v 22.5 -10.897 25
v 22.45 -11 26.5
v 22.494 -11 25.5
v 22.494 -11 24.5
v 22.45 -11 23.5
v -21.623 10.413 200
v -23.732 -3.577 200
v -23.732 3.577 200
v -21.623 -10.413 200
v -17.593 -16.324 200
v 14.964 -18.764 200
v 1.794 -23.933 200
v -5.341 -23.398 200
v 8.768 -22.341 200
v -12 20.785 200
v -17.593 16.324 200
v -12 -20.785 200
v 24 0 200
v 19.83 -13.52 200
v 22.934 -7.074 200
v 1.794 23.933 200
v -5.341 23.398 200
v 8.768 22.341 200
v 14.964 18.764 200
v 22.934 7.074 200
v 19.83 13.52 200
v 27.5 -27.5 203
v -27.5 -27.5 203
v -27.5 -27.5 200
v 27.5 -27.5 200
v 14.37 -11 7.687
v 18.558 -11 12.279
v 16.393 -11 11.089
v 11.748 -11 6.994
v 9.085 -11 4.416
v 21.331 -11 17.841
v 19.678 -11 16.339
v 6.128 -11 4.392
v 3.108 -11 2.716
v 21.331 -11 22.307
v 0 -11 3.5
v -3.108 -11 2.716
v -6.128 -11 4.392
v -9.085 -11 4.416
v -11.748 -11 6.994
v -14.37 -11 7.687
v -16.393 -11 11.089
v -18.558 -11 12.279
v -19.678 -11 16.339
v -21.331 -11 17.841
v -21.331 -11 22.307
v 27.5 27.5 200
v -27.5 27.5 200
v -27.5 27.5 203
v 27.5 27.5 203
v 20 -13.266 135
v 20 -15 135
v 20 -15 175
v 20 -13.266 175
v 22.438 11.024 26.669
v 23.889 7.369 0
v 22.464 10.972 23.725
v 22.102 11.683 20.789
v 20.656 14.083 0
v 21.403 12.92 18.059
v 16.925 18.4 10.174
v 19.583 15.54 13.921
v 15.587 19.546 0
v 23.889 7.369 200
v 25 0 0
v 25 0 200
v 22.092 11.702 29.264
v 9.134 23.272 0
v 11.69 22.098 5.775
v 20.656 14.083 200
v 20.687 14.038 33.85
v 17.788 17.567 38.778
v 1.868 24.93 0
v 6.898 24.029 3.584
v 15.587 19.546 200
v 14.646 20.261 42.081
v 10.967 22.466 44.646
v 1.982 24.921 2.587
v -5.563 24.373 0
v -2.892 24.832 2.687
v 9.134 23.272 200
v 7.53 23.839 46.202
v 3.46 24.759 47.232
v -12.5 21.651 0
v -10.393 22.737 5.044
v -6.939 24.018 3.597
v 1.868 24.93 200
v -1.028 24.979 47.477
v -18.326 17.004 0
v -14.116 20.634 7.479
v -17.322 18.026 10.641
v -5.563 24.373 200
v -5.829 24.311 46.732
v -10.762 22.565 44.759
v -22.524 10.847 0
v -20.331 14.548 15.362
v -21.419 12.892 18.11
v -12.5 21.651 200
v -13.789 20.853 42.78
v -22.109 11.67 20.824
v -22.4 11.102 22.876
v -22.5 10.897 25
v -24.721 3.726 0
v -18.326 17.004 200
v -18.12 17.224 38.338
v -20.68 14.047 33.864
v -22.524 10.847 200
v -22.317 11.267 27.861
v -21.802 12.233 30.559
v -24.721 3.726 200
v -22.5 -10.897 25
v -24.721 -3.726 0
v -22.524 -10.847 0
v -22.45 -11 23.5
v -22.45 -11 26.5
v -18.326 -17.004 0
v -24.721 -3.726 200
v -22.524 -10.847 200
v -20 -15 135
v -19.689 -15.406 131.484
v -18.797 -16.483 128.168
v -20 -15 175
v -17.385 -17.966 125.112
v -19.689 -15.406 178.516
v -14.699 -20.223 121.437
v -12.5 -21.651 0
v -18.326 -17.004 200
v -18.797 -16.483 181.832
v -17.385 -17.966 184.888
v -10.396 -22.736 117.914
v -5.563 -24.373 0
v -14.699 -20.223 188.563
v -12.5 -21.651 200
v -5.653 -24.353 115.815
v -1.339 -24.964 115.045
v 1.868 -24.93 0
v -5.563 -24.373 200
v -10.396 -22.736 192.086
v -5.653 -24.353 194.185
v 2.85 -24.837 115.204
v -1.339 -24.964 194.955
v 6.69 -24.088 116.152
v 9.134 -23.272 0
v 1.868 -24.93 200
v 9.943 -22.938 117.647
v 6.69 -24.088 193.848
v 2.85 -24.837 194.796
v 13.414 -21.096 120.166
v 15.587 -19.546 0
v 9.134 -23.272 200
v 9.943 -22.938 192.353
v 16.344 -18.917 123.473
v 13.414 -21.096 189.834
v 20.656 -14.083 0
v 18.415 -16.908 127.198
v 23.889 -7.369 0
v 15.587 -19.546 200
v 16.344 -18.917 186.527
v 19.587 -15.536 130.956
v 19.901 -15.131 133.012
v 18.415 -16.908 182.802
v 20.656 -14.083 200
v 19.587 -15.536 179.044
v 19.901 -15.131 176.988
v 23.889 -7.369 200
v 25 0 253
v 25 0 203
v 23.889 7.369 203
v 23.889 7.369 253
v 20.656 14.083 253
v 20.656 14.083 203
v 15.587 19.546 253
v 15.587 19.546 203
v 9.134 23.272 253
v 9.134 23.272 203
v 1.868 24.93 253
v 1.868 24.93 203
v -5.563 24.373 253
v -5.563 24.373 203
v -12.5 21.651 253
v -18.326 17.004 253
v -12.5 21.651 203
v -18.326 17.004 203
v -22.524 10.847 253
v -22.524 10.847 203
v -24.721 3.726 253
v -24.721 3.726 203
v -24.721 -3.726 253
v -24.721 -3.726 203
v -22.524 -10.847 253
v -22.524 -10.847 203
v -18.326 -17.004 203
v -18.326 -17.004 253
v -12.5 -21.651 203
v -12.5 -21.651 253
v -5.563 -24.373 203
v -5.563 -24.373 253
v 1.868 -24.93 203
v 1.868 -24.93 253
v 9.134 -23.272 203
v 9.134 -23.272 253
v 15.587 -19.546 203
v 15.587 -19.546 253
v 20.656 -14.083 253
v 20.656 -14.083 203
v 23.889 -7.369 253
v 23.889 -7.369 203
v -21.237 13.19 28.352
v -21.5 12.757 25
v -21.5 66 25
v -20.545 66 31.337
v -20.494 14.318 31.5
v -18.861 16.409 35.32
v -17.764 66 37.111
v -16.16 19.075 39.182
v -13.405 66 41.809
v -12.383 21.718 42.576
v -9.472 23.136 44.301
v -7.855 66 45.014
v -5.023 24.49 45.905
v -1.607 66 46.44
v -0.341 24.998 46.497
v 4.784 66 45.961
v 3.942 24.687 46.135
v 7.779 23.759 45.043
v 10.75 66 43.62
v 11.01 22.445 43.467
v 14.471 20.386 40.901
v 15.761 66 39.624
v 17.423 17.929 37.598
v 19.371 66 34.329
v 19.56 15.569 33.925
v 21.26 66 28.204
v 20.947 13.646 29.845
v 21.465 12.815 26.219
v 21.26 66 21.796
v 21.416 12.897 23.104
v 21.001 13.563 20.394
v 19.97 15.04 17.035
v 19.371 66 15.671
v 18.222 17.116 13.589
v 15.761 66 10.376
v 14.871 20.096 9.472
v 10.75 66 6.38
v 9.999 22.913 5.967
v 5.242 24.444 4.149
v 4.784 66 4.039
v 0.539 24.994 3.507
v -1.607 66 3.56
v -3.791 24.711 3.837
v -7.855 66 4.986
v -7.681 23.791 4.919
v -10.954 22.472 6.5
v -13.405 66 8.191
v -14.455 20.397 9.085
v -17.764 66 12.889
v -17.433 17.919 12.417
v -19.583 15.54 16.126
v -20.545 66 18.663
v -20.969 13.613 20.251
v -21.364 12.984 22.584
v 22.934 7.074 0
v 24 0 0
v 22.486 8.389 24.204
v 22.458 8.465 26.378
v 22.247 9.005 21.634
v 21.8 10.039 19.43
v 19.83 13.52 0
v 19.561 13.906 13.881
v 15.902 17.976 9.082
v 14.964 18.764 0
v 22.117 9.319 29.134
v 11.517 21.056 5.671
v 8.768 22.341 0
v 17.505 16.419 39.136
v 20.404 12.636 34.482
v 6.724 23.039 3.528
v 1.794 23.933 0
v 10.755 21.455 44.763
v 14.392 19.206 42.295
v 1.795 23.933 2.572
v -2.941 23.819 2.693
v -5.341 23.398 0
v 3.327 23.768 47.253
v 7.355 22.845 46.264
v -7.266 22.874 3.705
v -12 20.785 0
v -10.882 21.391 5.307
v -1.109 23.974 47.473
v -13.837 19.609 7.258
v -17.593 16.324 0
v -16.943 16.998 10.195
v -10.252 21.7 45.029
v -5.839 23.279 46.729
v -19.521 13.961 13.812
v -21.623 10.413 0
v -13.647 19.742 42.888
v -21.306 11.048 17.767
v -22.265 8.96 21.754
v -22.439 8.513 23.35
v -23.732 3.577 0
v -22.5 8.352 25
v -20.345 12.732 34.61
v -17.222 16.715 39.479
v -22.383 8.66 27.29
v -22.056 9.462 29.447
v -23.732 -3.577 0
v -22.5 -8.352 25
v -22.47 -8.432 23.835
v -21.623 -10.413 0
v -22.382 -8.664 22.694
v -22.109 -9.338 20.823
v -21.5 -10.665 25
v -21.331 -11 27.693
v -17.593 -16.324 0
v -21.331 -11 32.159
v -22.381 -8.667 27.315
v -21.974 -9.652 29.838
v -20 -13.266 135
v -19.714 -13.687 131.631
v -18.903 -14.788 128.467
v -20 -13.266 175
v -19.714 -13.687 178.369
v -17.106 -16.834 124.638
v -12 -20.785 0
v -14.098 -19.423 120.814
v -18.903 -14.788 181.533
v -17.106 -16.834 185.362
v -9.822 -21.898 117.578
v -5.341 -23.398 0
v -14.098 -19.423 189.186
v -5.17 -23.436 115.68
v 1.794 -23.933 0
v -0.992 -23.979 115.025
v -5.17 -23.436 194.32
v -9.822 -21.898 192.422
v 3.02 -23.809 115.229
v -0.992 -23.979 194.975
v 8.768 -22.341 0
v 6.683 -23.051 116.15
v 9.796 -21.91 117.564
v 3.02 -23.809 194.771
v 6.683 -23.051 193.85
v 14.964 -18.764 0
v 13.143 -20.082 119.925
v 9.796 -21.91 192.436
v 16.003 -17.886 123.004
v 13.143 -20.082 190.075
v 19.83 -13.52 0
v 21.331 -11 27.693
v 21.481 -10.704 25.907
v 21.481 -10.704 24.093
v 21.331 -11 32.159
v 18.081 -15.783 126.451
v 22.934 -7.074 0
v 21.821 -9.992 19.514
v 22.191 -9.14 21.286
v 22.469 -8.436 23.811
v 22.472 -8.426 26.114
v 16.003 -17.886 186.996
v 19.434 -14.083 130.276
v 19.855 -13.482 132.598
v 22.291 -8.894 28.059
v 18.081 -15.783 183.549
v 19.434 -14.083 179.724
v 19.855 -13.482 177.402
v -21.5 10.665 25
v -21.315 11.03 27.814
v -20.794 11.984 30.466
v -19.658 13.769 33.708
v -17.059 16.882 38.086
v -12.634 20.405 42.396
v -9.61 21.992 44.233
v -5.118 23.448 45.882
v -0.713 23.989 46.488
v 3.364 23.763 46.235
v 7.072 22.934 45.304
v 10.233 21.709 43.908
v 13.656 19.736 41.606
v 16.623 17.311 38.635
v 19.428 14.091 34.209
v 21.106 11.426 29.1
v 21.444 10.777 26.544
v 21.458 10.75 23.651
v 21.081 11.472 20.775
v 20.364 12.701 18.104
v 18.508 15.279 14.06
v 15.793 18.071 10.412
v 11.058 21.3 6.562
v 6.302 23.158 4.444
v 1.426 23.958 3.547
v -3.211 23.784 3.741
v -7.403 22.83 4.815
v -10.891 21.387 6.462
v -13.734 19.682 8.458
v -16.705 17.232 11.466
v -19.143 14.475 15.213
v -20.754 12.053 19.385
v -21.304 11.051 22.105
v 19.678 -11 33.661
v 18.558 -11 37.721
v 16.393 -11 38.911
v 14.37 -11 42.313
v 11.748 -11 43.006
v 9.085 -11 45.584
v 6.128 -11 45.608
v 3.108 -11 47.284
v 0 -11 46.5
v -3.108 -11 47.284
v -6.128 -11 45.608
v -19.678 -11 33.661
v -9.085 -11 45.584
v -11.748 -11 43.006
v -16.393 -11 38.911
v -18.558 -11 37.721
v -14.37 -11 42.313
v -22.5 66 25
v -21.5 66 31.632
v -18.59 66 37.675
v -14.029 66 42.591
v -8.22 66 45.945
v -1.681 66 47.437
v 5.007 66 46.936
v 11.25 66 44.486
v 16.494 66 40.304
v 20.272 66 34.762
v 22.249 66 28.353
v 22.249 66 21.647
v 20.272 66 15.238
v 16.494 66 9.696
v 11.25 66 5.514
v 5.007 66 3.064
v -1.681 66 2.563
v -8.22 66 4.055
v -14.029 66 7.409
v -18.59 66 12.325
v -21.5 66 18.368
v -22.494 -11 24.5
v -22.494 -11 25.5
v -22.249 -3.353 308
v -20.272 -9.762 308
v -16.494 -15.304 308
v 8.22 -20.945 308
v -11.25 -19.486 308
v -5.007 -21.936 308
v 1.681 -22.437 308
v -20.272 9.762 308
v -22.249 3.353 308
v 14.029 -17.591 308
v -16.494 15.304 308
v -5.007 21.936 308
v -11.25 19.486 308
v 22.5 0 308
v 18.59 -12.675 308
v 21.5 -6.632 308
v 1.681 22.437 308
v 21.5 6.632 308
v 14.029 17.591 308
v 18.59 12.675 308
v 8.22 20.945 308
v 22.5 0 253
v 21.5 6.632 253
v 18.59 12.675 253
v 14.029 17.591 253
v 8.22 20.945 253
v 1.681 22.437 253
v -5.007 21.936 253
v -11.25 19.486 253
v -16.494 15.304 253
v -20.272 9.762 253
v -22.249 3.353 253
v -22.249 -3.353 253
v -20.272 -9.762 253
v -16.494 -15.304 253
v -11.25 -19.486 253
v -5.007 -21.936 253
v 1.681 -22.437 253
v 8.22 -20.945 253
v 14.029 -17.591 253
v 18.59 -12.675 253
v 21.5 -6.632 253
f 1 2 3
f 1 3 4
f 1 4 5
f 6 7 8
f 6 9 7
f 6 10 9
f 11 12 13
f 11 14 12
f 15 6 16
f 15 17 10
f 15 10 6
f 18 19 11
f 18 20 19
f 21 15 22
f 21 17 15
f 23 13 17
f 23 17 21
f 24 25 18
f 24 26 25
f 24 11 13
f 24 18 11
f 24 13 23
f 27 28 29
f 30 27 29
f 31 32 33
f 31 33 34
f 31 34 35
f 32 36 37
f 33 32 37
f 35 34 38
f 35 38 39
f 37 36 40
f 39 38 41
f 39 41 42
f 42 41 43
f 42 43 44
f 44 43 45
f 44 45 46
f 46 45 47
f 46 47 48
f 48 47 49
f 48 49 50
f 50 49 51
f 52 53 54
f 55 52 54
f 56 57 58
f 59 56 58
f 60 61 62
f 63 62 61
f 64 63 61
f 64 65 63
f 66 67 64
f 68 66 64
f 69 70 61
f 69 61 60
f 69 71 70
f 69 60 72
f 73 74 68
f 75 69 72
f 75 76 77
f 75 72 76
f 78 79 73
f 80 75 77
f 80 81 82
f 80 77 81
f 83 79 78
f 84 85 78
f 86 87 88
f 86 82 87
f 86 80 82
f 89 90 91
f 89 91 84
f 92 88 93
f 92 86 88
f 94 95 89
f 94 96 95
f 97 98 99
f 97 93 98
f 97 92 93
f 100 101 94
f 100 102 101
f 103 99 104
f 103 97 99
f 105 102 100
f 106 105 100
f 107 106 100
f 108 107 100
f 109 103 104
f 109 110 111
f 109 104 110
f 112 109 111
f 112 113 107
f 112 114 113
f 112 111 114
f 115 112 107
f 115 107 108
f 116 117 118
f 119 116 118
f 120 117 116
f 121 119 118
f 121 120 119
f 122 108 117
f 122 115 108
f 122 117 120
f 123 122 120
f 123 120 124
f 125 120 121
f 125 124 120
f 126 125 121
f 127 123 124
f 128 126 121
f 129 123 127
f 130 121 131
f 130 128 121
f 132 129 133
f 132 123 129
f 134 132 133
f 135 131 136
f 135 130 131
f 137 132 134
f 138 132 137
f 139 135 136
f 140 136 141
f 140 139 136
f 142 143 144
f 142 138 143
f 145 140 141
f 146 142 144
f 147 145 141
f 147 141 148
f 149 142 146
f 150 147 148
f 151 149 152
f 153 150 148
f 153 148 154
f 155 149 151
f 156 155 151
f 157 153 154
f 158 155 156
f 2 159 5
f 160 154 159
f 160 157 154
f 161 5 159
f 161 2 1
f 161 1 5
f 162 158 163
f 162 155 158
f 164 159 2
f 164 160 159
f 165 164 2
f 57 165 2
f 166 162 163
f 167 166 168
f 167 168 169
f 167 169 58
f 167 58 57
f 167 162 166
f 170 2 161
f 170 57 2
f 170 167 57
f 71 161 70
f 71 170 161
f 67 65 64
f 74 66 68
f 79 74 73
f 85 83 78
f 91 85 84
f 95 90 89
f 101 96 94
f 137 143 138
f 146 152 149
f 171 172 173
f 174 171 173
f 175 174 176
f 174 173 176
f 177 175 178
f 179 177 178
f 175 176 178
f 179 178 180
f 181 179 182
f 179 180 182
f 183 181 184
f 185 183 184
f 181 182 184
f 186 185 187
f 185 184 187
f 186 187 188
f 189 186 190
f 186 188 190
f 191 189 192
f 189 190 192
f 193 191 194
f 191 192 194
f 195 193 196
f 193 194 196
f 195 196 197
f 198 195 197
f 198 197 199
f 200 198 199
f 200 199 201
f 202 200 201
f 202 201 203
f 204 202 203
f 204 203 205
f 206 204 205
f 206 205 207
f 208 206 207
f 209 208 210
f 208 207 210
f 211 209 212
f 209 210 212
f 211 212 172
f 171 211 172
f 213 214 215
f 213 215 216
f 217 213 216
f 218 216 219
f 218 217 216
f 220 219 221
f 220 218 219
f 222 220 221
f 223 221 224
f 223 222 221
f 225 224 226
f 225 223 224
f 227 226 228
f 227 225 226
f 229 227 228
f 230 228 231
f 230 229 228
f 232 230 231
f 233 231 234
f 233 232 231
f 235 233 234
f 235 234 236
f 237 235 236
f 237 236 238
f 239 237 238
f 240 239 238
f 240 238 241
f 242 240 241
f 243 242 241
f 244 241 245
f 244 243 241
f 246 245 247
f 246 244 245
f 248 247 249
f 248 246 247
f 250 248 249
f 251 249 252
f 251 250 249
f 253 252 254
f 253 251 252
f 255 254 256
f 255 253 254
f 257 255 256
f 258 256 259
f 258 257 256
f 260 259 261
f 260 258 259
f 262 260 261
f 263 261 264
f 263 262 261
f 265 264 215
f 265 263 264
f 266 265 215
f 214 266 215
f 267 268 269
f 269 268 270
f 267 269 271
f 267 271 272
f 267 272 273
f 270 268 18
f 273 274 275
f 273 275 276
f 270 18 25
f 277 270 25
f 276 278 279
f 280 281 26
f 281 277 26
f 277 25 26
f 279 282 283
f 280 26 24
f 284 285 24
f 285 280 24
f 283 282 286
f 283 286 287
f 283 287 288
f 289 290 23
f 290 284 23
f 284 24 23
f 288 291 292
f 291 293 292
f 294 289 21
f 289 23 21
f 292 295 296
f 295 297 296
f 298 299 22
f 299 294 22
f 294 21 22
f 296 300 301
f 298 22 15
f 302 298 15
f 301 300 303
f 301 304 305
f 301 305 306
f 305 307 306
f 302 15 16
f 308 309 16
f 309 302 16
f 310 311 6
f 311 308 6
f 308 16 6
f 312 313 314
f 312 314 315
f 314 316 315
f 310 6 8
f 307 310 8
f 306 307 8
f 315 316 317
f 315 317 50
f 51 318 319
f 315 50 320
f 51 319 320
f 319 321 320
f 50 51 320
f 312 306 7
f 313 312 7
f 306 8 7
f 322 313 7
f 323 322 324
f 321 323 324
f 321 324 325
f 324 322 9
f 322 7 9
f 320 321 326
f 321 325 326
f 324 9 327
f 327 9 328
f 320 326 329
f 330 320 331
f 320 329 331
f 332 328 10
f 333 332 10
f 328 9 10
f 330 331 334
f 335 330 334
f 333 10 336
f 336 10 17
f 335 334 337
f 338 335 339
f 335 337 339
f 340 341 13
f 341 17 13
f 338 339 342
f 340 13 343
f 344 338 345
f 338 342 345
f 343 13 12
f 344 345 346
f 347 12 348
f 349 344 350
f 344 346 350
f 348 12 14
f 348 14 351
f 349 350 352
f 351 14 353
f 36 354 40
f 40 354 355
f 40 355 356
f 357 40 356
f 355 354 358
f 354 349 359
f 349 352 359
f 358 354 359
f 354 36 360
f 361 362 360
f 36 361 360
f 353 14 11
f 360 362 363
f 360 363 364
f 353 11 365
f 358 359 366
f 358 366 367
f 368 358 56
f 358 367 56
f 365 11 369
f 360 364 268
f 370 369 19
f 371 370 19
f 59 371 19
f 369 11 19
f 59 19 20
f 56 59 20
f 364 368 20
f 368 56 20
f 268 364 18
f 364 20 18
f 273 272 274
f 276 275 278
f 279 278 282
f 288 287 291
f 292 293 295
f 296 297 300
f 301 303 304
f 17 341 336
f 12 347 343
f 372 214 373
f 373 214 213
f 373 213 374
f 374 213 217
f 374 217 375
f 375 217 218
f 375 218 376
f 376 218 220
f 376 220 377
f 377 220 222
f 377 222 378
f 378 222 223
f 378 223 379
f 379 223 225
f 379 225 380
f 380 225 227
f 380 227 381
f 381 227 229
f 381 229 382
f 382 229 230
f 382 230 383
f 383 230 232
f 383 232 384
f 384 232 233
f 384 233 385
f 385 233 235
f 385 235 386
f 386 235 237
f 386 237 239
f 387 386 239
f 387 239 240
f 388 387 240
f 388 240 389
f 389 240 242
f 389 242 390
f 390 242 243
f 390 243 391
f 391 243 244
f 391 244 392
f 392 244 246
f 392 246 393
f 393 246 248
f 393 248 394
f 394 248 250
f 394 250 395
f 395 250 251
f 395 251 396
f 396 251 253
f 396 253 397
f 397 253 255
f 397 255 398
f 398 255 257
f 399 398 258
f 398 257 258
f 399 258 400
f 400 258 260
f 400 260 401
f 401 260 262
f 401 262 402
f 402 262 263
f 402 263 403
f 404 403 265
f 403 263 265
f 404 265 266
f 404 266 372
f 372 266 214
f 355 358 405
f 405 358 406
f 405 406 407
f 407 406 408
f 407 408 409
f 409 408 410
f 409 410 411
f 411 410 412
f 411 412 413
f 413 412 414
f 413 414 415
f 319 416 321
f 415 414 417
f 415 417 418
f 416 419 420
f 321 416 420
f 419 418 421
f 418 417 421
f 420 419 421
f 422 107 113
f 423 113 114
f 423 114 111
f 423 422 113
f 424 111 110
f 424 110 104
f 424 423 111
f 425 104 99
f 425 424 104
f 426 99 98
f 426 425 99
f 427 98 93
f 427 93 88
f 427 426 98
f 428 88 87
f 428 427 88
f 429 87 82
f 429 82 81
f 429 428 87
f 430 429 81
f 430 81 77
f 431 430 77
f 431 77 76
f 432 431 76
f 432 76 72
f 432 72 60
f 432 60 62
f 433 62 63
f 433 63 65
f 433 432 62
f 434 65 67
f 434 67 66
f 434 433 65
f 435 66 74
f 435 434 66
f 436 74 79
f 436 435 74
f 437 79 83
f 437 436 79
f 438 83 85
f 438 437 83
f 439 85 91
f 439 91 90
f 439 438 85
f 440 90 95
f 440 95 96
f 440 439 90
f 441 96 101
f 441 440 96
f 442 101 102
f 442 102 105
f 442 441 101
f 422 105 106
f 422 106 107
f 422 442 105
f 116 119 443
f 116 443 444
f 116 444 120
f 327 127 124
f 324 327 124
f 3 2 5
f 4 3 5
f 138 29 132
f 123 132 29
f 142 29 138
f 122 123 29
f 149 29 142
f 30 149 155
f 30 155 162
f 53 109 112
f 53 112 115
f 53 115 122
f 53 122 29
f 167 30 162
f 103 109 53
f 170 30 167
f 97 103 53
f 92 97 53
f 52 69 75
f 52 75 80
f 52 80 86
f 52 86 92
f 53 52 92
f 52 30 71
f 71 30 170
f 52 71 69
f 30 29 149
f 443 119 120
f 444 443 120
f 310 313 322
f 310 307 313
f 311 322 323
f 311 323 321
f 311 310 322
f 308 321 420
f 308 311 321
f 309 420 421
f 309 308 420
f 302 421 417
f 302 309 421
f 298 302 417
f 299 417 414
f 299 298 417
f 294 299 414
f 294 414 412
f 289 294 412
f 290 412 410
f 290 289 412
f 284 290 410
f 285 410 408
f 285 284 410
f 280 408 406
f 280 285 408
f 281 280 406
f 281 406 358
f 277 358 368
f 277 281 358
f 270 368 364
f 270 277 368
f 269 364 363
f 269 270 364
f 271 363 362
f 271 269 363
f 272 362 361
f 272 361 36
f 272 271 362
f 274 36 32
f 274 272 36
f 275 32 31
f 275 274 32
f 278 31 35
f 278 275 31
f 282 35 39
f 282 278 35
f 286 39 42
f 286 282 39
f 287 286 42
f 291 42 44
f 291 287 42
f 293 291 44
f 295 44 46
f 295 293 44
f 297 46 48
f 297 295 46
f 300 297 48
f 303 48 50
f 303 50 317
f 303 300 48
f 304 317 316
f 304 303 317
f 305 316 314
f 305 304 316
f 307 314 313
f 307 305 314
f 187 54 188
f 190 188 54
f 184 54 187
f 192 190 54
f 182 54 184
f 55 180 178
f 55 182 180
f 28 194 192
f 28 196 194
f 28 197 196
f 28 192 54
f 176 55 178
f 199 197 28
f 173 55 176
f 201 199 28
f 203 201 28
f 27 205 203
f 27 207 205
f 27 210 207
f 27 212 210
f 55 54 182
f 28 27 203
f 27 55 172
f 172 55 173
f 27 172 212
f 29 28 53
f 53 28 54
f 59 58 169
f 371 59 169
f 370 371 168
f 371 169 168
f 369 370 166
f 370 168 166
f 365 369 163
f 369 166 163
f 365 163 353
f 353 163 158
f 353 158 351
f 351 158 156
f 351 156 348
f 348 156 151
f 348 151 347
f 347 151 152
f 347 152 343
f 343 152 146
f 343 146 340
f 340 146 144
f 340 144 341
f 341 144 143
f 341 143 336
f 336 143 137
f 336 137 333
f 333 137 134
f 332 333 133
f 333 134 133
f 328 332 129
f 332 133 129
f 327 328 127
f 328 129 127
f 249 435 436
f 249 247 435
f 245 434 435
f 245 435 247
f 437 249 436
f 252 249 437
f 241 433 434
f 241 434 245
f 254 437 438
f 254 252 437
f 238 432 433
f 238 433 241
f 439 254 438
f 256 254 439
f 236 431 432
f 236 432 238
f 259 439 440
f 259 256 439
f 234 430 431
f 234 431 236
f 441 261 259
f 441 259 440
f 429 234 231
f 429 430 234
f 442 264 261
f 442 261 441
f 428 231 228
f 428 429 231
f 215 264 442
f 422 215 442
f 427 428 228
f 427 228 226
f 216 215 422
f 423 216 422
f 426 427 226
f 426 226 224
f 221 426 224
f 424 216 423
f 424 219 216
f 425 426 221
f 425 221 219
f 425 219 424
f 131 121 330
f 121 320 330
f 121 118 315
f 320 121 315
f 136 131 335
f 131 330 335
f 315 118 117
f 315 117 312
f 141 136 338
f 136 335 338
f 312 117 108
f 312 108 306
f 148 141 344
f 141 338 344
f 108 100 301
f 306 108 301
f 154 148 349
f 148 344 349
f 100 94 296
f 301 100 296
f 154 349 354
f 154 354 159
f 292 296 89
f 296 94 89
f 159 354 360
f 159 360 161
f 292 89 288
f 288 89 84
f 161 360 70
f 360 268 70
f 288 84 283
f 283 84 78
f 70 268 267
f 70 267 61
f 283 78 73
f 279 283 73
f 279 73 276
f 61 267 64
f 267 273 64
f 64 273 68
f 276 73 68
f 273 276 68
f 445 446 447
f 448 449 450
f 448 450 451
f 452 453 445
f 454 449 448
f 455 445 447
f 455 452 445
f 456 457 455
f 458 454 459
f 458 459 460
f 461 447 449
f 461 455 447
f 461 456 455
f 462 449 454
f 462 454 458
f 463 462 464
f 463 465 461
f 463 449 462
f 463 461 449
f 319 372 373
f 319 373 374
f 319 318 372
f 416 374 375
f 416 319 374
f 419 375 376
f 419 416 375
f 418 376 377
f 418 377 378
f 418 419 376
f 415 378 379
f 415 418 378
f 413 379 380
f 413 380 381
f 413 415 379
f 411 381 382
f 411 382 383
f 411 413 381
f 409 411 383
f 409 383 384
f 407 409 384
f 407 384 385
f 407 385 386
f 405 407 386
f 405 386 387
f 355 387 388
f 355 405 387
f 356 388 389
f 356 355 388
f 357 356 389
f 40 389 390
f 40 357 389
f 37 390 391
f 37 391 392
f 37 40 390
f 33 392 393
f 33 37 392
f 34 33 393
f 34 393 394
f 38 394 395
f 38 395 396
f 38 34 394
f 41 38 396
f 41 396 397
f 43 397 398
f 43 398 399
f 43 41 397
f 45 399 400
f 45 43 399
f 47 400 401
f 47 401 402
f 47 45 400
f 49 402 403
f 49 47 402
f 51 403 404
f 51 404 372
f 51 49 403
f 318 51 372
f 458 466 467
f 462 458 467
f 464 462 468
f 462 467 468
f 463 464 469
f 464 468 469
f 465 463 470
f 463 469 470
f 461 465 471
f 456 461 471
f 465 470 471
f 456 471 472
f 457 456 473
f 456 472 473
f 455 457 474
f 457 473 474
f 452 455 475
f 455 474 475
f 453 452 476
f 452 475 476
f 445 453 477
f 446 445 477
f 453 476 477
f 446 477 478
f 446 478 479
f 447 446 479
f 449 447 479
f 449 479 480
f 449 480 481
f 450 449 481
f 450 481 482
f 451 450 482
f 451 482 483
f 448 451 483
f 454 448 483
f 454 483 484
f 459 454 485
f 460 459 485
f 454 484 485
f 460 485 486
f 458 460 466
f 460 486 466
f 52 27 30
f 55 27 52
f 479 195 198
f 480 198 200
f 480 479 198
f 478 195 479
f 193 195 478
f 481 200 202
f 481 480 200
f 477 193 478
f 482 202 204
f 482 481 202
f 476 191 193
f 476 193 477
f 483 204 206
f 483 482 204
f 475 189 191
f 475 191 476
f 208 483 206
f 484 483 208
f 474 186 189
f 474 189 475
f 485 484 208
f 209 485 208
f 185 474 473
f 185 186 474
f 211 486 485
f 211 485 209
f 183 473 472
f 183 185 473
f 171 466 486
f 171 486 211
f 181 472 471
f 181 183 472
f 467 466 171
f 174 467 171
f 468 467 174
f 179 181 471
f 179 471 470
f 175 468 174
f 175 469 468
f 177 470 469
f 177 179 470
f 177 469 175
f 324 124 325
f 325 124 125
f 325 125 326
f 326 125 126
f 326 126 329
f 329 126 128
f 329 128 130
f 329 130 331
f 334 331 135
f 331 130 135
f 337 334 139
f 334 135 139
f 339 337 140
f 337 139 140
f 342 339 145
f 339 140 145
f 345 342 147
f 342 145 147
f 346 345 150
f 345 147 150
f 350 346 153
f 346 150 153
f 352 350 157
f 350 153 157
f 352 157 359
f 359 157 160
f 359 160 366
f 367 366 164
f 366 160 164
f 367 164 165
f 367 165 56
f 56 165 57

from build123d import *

# Parameters (mm, degrees)
F1_R      = 25
F1_R_2    = 24
F4_DEPTH  = 27.5
F5_R      = 25
F6_DEPTH  = 50
F7_R      = 22.5
F8_DEPTH  = 55
F9_R      = 21.5
F10_DEPTH = 20
F9_R_2    = 22.5
F11_DEPTH = 38.5
F13_DEPTH = 38.5


with BuildPart() as f2:
    # F2: sweep along a path in F0
    with BuildLine(Plane.YZ) as f2_path:
        Line((0, 0), (0, 200))
    # F1 (on Top) → F2 (sweep)
    with BuildSketch(Plane.XY):
        Circle(F1_R)
        Circle(F1_R_2, mode=Mode.SUBTRACT)
    sweep(path=f2_path.line)

    # F3 (on Right) → F4 (join, symmetric)
    with BuildSketch(Plane.YZ):
        Polygon((-27.5, 200), (-25, 200), (25, 200), (27.5, 200), (27.5, 203), (-27.5, 203), align=None)
    extrude(amount=F4_DEPTH, both=True)

    # F5 (on face) → F6 (join)
    with BuildSketch(Plane.XY.offset(203)):
        Circle(F5_R)
    extrude(amount=F6_DEPTH)

    # F7 (on face) → F8 (join)
    with BuildSketch(Plane.XY.offset(253)):
        Circle(F7_R)
    extrude(amount=F8_DEPTH)

    # F9 (on face) → F10 (cut)
    with BuildSketch(Plane(origin=(0, 27.5, 0), x_dir=(-1, 0, 0), z_dir=(0, 1, 0))):
        with Locations((0, 25)):
            Circle(F9_R)
    extrude(amount=-F10_DEPTH, mode=Mode.SUBTRACT)

    # F9 (on face) → F11 (join, symmetric)
    with BuildSketch(Plane(origin=(0, 27.5, 0), x_dir=(-1, 0, 0), z_dir=(0, 1, 0))):
        with Locations((0, 25)):
            Circle(F9_R_2)
        with Locations((0, 25)):
            Circle(F9_R, mode=Mode.SUBTRACT)
    extrude(amount=F11_DEPTH, both=True)

    # F12 (on face) → F13 (cut)
    with BuildSketch(Plane.XZ.offset(27.5)):
        with BuildLine():
            Line((-20, 175), (-20, 135))
            ThreePointArc((-20, 135), (0, 115), (20, 135))
            Line((20, 135), (20, 175))
            ThreePointArc((20, 175), (0, 195), (-20, 175))
        make_face()
    extrude(amount=-F13_DEPTH, mode=Mode.SUBTRACT)


solid = f2.part
